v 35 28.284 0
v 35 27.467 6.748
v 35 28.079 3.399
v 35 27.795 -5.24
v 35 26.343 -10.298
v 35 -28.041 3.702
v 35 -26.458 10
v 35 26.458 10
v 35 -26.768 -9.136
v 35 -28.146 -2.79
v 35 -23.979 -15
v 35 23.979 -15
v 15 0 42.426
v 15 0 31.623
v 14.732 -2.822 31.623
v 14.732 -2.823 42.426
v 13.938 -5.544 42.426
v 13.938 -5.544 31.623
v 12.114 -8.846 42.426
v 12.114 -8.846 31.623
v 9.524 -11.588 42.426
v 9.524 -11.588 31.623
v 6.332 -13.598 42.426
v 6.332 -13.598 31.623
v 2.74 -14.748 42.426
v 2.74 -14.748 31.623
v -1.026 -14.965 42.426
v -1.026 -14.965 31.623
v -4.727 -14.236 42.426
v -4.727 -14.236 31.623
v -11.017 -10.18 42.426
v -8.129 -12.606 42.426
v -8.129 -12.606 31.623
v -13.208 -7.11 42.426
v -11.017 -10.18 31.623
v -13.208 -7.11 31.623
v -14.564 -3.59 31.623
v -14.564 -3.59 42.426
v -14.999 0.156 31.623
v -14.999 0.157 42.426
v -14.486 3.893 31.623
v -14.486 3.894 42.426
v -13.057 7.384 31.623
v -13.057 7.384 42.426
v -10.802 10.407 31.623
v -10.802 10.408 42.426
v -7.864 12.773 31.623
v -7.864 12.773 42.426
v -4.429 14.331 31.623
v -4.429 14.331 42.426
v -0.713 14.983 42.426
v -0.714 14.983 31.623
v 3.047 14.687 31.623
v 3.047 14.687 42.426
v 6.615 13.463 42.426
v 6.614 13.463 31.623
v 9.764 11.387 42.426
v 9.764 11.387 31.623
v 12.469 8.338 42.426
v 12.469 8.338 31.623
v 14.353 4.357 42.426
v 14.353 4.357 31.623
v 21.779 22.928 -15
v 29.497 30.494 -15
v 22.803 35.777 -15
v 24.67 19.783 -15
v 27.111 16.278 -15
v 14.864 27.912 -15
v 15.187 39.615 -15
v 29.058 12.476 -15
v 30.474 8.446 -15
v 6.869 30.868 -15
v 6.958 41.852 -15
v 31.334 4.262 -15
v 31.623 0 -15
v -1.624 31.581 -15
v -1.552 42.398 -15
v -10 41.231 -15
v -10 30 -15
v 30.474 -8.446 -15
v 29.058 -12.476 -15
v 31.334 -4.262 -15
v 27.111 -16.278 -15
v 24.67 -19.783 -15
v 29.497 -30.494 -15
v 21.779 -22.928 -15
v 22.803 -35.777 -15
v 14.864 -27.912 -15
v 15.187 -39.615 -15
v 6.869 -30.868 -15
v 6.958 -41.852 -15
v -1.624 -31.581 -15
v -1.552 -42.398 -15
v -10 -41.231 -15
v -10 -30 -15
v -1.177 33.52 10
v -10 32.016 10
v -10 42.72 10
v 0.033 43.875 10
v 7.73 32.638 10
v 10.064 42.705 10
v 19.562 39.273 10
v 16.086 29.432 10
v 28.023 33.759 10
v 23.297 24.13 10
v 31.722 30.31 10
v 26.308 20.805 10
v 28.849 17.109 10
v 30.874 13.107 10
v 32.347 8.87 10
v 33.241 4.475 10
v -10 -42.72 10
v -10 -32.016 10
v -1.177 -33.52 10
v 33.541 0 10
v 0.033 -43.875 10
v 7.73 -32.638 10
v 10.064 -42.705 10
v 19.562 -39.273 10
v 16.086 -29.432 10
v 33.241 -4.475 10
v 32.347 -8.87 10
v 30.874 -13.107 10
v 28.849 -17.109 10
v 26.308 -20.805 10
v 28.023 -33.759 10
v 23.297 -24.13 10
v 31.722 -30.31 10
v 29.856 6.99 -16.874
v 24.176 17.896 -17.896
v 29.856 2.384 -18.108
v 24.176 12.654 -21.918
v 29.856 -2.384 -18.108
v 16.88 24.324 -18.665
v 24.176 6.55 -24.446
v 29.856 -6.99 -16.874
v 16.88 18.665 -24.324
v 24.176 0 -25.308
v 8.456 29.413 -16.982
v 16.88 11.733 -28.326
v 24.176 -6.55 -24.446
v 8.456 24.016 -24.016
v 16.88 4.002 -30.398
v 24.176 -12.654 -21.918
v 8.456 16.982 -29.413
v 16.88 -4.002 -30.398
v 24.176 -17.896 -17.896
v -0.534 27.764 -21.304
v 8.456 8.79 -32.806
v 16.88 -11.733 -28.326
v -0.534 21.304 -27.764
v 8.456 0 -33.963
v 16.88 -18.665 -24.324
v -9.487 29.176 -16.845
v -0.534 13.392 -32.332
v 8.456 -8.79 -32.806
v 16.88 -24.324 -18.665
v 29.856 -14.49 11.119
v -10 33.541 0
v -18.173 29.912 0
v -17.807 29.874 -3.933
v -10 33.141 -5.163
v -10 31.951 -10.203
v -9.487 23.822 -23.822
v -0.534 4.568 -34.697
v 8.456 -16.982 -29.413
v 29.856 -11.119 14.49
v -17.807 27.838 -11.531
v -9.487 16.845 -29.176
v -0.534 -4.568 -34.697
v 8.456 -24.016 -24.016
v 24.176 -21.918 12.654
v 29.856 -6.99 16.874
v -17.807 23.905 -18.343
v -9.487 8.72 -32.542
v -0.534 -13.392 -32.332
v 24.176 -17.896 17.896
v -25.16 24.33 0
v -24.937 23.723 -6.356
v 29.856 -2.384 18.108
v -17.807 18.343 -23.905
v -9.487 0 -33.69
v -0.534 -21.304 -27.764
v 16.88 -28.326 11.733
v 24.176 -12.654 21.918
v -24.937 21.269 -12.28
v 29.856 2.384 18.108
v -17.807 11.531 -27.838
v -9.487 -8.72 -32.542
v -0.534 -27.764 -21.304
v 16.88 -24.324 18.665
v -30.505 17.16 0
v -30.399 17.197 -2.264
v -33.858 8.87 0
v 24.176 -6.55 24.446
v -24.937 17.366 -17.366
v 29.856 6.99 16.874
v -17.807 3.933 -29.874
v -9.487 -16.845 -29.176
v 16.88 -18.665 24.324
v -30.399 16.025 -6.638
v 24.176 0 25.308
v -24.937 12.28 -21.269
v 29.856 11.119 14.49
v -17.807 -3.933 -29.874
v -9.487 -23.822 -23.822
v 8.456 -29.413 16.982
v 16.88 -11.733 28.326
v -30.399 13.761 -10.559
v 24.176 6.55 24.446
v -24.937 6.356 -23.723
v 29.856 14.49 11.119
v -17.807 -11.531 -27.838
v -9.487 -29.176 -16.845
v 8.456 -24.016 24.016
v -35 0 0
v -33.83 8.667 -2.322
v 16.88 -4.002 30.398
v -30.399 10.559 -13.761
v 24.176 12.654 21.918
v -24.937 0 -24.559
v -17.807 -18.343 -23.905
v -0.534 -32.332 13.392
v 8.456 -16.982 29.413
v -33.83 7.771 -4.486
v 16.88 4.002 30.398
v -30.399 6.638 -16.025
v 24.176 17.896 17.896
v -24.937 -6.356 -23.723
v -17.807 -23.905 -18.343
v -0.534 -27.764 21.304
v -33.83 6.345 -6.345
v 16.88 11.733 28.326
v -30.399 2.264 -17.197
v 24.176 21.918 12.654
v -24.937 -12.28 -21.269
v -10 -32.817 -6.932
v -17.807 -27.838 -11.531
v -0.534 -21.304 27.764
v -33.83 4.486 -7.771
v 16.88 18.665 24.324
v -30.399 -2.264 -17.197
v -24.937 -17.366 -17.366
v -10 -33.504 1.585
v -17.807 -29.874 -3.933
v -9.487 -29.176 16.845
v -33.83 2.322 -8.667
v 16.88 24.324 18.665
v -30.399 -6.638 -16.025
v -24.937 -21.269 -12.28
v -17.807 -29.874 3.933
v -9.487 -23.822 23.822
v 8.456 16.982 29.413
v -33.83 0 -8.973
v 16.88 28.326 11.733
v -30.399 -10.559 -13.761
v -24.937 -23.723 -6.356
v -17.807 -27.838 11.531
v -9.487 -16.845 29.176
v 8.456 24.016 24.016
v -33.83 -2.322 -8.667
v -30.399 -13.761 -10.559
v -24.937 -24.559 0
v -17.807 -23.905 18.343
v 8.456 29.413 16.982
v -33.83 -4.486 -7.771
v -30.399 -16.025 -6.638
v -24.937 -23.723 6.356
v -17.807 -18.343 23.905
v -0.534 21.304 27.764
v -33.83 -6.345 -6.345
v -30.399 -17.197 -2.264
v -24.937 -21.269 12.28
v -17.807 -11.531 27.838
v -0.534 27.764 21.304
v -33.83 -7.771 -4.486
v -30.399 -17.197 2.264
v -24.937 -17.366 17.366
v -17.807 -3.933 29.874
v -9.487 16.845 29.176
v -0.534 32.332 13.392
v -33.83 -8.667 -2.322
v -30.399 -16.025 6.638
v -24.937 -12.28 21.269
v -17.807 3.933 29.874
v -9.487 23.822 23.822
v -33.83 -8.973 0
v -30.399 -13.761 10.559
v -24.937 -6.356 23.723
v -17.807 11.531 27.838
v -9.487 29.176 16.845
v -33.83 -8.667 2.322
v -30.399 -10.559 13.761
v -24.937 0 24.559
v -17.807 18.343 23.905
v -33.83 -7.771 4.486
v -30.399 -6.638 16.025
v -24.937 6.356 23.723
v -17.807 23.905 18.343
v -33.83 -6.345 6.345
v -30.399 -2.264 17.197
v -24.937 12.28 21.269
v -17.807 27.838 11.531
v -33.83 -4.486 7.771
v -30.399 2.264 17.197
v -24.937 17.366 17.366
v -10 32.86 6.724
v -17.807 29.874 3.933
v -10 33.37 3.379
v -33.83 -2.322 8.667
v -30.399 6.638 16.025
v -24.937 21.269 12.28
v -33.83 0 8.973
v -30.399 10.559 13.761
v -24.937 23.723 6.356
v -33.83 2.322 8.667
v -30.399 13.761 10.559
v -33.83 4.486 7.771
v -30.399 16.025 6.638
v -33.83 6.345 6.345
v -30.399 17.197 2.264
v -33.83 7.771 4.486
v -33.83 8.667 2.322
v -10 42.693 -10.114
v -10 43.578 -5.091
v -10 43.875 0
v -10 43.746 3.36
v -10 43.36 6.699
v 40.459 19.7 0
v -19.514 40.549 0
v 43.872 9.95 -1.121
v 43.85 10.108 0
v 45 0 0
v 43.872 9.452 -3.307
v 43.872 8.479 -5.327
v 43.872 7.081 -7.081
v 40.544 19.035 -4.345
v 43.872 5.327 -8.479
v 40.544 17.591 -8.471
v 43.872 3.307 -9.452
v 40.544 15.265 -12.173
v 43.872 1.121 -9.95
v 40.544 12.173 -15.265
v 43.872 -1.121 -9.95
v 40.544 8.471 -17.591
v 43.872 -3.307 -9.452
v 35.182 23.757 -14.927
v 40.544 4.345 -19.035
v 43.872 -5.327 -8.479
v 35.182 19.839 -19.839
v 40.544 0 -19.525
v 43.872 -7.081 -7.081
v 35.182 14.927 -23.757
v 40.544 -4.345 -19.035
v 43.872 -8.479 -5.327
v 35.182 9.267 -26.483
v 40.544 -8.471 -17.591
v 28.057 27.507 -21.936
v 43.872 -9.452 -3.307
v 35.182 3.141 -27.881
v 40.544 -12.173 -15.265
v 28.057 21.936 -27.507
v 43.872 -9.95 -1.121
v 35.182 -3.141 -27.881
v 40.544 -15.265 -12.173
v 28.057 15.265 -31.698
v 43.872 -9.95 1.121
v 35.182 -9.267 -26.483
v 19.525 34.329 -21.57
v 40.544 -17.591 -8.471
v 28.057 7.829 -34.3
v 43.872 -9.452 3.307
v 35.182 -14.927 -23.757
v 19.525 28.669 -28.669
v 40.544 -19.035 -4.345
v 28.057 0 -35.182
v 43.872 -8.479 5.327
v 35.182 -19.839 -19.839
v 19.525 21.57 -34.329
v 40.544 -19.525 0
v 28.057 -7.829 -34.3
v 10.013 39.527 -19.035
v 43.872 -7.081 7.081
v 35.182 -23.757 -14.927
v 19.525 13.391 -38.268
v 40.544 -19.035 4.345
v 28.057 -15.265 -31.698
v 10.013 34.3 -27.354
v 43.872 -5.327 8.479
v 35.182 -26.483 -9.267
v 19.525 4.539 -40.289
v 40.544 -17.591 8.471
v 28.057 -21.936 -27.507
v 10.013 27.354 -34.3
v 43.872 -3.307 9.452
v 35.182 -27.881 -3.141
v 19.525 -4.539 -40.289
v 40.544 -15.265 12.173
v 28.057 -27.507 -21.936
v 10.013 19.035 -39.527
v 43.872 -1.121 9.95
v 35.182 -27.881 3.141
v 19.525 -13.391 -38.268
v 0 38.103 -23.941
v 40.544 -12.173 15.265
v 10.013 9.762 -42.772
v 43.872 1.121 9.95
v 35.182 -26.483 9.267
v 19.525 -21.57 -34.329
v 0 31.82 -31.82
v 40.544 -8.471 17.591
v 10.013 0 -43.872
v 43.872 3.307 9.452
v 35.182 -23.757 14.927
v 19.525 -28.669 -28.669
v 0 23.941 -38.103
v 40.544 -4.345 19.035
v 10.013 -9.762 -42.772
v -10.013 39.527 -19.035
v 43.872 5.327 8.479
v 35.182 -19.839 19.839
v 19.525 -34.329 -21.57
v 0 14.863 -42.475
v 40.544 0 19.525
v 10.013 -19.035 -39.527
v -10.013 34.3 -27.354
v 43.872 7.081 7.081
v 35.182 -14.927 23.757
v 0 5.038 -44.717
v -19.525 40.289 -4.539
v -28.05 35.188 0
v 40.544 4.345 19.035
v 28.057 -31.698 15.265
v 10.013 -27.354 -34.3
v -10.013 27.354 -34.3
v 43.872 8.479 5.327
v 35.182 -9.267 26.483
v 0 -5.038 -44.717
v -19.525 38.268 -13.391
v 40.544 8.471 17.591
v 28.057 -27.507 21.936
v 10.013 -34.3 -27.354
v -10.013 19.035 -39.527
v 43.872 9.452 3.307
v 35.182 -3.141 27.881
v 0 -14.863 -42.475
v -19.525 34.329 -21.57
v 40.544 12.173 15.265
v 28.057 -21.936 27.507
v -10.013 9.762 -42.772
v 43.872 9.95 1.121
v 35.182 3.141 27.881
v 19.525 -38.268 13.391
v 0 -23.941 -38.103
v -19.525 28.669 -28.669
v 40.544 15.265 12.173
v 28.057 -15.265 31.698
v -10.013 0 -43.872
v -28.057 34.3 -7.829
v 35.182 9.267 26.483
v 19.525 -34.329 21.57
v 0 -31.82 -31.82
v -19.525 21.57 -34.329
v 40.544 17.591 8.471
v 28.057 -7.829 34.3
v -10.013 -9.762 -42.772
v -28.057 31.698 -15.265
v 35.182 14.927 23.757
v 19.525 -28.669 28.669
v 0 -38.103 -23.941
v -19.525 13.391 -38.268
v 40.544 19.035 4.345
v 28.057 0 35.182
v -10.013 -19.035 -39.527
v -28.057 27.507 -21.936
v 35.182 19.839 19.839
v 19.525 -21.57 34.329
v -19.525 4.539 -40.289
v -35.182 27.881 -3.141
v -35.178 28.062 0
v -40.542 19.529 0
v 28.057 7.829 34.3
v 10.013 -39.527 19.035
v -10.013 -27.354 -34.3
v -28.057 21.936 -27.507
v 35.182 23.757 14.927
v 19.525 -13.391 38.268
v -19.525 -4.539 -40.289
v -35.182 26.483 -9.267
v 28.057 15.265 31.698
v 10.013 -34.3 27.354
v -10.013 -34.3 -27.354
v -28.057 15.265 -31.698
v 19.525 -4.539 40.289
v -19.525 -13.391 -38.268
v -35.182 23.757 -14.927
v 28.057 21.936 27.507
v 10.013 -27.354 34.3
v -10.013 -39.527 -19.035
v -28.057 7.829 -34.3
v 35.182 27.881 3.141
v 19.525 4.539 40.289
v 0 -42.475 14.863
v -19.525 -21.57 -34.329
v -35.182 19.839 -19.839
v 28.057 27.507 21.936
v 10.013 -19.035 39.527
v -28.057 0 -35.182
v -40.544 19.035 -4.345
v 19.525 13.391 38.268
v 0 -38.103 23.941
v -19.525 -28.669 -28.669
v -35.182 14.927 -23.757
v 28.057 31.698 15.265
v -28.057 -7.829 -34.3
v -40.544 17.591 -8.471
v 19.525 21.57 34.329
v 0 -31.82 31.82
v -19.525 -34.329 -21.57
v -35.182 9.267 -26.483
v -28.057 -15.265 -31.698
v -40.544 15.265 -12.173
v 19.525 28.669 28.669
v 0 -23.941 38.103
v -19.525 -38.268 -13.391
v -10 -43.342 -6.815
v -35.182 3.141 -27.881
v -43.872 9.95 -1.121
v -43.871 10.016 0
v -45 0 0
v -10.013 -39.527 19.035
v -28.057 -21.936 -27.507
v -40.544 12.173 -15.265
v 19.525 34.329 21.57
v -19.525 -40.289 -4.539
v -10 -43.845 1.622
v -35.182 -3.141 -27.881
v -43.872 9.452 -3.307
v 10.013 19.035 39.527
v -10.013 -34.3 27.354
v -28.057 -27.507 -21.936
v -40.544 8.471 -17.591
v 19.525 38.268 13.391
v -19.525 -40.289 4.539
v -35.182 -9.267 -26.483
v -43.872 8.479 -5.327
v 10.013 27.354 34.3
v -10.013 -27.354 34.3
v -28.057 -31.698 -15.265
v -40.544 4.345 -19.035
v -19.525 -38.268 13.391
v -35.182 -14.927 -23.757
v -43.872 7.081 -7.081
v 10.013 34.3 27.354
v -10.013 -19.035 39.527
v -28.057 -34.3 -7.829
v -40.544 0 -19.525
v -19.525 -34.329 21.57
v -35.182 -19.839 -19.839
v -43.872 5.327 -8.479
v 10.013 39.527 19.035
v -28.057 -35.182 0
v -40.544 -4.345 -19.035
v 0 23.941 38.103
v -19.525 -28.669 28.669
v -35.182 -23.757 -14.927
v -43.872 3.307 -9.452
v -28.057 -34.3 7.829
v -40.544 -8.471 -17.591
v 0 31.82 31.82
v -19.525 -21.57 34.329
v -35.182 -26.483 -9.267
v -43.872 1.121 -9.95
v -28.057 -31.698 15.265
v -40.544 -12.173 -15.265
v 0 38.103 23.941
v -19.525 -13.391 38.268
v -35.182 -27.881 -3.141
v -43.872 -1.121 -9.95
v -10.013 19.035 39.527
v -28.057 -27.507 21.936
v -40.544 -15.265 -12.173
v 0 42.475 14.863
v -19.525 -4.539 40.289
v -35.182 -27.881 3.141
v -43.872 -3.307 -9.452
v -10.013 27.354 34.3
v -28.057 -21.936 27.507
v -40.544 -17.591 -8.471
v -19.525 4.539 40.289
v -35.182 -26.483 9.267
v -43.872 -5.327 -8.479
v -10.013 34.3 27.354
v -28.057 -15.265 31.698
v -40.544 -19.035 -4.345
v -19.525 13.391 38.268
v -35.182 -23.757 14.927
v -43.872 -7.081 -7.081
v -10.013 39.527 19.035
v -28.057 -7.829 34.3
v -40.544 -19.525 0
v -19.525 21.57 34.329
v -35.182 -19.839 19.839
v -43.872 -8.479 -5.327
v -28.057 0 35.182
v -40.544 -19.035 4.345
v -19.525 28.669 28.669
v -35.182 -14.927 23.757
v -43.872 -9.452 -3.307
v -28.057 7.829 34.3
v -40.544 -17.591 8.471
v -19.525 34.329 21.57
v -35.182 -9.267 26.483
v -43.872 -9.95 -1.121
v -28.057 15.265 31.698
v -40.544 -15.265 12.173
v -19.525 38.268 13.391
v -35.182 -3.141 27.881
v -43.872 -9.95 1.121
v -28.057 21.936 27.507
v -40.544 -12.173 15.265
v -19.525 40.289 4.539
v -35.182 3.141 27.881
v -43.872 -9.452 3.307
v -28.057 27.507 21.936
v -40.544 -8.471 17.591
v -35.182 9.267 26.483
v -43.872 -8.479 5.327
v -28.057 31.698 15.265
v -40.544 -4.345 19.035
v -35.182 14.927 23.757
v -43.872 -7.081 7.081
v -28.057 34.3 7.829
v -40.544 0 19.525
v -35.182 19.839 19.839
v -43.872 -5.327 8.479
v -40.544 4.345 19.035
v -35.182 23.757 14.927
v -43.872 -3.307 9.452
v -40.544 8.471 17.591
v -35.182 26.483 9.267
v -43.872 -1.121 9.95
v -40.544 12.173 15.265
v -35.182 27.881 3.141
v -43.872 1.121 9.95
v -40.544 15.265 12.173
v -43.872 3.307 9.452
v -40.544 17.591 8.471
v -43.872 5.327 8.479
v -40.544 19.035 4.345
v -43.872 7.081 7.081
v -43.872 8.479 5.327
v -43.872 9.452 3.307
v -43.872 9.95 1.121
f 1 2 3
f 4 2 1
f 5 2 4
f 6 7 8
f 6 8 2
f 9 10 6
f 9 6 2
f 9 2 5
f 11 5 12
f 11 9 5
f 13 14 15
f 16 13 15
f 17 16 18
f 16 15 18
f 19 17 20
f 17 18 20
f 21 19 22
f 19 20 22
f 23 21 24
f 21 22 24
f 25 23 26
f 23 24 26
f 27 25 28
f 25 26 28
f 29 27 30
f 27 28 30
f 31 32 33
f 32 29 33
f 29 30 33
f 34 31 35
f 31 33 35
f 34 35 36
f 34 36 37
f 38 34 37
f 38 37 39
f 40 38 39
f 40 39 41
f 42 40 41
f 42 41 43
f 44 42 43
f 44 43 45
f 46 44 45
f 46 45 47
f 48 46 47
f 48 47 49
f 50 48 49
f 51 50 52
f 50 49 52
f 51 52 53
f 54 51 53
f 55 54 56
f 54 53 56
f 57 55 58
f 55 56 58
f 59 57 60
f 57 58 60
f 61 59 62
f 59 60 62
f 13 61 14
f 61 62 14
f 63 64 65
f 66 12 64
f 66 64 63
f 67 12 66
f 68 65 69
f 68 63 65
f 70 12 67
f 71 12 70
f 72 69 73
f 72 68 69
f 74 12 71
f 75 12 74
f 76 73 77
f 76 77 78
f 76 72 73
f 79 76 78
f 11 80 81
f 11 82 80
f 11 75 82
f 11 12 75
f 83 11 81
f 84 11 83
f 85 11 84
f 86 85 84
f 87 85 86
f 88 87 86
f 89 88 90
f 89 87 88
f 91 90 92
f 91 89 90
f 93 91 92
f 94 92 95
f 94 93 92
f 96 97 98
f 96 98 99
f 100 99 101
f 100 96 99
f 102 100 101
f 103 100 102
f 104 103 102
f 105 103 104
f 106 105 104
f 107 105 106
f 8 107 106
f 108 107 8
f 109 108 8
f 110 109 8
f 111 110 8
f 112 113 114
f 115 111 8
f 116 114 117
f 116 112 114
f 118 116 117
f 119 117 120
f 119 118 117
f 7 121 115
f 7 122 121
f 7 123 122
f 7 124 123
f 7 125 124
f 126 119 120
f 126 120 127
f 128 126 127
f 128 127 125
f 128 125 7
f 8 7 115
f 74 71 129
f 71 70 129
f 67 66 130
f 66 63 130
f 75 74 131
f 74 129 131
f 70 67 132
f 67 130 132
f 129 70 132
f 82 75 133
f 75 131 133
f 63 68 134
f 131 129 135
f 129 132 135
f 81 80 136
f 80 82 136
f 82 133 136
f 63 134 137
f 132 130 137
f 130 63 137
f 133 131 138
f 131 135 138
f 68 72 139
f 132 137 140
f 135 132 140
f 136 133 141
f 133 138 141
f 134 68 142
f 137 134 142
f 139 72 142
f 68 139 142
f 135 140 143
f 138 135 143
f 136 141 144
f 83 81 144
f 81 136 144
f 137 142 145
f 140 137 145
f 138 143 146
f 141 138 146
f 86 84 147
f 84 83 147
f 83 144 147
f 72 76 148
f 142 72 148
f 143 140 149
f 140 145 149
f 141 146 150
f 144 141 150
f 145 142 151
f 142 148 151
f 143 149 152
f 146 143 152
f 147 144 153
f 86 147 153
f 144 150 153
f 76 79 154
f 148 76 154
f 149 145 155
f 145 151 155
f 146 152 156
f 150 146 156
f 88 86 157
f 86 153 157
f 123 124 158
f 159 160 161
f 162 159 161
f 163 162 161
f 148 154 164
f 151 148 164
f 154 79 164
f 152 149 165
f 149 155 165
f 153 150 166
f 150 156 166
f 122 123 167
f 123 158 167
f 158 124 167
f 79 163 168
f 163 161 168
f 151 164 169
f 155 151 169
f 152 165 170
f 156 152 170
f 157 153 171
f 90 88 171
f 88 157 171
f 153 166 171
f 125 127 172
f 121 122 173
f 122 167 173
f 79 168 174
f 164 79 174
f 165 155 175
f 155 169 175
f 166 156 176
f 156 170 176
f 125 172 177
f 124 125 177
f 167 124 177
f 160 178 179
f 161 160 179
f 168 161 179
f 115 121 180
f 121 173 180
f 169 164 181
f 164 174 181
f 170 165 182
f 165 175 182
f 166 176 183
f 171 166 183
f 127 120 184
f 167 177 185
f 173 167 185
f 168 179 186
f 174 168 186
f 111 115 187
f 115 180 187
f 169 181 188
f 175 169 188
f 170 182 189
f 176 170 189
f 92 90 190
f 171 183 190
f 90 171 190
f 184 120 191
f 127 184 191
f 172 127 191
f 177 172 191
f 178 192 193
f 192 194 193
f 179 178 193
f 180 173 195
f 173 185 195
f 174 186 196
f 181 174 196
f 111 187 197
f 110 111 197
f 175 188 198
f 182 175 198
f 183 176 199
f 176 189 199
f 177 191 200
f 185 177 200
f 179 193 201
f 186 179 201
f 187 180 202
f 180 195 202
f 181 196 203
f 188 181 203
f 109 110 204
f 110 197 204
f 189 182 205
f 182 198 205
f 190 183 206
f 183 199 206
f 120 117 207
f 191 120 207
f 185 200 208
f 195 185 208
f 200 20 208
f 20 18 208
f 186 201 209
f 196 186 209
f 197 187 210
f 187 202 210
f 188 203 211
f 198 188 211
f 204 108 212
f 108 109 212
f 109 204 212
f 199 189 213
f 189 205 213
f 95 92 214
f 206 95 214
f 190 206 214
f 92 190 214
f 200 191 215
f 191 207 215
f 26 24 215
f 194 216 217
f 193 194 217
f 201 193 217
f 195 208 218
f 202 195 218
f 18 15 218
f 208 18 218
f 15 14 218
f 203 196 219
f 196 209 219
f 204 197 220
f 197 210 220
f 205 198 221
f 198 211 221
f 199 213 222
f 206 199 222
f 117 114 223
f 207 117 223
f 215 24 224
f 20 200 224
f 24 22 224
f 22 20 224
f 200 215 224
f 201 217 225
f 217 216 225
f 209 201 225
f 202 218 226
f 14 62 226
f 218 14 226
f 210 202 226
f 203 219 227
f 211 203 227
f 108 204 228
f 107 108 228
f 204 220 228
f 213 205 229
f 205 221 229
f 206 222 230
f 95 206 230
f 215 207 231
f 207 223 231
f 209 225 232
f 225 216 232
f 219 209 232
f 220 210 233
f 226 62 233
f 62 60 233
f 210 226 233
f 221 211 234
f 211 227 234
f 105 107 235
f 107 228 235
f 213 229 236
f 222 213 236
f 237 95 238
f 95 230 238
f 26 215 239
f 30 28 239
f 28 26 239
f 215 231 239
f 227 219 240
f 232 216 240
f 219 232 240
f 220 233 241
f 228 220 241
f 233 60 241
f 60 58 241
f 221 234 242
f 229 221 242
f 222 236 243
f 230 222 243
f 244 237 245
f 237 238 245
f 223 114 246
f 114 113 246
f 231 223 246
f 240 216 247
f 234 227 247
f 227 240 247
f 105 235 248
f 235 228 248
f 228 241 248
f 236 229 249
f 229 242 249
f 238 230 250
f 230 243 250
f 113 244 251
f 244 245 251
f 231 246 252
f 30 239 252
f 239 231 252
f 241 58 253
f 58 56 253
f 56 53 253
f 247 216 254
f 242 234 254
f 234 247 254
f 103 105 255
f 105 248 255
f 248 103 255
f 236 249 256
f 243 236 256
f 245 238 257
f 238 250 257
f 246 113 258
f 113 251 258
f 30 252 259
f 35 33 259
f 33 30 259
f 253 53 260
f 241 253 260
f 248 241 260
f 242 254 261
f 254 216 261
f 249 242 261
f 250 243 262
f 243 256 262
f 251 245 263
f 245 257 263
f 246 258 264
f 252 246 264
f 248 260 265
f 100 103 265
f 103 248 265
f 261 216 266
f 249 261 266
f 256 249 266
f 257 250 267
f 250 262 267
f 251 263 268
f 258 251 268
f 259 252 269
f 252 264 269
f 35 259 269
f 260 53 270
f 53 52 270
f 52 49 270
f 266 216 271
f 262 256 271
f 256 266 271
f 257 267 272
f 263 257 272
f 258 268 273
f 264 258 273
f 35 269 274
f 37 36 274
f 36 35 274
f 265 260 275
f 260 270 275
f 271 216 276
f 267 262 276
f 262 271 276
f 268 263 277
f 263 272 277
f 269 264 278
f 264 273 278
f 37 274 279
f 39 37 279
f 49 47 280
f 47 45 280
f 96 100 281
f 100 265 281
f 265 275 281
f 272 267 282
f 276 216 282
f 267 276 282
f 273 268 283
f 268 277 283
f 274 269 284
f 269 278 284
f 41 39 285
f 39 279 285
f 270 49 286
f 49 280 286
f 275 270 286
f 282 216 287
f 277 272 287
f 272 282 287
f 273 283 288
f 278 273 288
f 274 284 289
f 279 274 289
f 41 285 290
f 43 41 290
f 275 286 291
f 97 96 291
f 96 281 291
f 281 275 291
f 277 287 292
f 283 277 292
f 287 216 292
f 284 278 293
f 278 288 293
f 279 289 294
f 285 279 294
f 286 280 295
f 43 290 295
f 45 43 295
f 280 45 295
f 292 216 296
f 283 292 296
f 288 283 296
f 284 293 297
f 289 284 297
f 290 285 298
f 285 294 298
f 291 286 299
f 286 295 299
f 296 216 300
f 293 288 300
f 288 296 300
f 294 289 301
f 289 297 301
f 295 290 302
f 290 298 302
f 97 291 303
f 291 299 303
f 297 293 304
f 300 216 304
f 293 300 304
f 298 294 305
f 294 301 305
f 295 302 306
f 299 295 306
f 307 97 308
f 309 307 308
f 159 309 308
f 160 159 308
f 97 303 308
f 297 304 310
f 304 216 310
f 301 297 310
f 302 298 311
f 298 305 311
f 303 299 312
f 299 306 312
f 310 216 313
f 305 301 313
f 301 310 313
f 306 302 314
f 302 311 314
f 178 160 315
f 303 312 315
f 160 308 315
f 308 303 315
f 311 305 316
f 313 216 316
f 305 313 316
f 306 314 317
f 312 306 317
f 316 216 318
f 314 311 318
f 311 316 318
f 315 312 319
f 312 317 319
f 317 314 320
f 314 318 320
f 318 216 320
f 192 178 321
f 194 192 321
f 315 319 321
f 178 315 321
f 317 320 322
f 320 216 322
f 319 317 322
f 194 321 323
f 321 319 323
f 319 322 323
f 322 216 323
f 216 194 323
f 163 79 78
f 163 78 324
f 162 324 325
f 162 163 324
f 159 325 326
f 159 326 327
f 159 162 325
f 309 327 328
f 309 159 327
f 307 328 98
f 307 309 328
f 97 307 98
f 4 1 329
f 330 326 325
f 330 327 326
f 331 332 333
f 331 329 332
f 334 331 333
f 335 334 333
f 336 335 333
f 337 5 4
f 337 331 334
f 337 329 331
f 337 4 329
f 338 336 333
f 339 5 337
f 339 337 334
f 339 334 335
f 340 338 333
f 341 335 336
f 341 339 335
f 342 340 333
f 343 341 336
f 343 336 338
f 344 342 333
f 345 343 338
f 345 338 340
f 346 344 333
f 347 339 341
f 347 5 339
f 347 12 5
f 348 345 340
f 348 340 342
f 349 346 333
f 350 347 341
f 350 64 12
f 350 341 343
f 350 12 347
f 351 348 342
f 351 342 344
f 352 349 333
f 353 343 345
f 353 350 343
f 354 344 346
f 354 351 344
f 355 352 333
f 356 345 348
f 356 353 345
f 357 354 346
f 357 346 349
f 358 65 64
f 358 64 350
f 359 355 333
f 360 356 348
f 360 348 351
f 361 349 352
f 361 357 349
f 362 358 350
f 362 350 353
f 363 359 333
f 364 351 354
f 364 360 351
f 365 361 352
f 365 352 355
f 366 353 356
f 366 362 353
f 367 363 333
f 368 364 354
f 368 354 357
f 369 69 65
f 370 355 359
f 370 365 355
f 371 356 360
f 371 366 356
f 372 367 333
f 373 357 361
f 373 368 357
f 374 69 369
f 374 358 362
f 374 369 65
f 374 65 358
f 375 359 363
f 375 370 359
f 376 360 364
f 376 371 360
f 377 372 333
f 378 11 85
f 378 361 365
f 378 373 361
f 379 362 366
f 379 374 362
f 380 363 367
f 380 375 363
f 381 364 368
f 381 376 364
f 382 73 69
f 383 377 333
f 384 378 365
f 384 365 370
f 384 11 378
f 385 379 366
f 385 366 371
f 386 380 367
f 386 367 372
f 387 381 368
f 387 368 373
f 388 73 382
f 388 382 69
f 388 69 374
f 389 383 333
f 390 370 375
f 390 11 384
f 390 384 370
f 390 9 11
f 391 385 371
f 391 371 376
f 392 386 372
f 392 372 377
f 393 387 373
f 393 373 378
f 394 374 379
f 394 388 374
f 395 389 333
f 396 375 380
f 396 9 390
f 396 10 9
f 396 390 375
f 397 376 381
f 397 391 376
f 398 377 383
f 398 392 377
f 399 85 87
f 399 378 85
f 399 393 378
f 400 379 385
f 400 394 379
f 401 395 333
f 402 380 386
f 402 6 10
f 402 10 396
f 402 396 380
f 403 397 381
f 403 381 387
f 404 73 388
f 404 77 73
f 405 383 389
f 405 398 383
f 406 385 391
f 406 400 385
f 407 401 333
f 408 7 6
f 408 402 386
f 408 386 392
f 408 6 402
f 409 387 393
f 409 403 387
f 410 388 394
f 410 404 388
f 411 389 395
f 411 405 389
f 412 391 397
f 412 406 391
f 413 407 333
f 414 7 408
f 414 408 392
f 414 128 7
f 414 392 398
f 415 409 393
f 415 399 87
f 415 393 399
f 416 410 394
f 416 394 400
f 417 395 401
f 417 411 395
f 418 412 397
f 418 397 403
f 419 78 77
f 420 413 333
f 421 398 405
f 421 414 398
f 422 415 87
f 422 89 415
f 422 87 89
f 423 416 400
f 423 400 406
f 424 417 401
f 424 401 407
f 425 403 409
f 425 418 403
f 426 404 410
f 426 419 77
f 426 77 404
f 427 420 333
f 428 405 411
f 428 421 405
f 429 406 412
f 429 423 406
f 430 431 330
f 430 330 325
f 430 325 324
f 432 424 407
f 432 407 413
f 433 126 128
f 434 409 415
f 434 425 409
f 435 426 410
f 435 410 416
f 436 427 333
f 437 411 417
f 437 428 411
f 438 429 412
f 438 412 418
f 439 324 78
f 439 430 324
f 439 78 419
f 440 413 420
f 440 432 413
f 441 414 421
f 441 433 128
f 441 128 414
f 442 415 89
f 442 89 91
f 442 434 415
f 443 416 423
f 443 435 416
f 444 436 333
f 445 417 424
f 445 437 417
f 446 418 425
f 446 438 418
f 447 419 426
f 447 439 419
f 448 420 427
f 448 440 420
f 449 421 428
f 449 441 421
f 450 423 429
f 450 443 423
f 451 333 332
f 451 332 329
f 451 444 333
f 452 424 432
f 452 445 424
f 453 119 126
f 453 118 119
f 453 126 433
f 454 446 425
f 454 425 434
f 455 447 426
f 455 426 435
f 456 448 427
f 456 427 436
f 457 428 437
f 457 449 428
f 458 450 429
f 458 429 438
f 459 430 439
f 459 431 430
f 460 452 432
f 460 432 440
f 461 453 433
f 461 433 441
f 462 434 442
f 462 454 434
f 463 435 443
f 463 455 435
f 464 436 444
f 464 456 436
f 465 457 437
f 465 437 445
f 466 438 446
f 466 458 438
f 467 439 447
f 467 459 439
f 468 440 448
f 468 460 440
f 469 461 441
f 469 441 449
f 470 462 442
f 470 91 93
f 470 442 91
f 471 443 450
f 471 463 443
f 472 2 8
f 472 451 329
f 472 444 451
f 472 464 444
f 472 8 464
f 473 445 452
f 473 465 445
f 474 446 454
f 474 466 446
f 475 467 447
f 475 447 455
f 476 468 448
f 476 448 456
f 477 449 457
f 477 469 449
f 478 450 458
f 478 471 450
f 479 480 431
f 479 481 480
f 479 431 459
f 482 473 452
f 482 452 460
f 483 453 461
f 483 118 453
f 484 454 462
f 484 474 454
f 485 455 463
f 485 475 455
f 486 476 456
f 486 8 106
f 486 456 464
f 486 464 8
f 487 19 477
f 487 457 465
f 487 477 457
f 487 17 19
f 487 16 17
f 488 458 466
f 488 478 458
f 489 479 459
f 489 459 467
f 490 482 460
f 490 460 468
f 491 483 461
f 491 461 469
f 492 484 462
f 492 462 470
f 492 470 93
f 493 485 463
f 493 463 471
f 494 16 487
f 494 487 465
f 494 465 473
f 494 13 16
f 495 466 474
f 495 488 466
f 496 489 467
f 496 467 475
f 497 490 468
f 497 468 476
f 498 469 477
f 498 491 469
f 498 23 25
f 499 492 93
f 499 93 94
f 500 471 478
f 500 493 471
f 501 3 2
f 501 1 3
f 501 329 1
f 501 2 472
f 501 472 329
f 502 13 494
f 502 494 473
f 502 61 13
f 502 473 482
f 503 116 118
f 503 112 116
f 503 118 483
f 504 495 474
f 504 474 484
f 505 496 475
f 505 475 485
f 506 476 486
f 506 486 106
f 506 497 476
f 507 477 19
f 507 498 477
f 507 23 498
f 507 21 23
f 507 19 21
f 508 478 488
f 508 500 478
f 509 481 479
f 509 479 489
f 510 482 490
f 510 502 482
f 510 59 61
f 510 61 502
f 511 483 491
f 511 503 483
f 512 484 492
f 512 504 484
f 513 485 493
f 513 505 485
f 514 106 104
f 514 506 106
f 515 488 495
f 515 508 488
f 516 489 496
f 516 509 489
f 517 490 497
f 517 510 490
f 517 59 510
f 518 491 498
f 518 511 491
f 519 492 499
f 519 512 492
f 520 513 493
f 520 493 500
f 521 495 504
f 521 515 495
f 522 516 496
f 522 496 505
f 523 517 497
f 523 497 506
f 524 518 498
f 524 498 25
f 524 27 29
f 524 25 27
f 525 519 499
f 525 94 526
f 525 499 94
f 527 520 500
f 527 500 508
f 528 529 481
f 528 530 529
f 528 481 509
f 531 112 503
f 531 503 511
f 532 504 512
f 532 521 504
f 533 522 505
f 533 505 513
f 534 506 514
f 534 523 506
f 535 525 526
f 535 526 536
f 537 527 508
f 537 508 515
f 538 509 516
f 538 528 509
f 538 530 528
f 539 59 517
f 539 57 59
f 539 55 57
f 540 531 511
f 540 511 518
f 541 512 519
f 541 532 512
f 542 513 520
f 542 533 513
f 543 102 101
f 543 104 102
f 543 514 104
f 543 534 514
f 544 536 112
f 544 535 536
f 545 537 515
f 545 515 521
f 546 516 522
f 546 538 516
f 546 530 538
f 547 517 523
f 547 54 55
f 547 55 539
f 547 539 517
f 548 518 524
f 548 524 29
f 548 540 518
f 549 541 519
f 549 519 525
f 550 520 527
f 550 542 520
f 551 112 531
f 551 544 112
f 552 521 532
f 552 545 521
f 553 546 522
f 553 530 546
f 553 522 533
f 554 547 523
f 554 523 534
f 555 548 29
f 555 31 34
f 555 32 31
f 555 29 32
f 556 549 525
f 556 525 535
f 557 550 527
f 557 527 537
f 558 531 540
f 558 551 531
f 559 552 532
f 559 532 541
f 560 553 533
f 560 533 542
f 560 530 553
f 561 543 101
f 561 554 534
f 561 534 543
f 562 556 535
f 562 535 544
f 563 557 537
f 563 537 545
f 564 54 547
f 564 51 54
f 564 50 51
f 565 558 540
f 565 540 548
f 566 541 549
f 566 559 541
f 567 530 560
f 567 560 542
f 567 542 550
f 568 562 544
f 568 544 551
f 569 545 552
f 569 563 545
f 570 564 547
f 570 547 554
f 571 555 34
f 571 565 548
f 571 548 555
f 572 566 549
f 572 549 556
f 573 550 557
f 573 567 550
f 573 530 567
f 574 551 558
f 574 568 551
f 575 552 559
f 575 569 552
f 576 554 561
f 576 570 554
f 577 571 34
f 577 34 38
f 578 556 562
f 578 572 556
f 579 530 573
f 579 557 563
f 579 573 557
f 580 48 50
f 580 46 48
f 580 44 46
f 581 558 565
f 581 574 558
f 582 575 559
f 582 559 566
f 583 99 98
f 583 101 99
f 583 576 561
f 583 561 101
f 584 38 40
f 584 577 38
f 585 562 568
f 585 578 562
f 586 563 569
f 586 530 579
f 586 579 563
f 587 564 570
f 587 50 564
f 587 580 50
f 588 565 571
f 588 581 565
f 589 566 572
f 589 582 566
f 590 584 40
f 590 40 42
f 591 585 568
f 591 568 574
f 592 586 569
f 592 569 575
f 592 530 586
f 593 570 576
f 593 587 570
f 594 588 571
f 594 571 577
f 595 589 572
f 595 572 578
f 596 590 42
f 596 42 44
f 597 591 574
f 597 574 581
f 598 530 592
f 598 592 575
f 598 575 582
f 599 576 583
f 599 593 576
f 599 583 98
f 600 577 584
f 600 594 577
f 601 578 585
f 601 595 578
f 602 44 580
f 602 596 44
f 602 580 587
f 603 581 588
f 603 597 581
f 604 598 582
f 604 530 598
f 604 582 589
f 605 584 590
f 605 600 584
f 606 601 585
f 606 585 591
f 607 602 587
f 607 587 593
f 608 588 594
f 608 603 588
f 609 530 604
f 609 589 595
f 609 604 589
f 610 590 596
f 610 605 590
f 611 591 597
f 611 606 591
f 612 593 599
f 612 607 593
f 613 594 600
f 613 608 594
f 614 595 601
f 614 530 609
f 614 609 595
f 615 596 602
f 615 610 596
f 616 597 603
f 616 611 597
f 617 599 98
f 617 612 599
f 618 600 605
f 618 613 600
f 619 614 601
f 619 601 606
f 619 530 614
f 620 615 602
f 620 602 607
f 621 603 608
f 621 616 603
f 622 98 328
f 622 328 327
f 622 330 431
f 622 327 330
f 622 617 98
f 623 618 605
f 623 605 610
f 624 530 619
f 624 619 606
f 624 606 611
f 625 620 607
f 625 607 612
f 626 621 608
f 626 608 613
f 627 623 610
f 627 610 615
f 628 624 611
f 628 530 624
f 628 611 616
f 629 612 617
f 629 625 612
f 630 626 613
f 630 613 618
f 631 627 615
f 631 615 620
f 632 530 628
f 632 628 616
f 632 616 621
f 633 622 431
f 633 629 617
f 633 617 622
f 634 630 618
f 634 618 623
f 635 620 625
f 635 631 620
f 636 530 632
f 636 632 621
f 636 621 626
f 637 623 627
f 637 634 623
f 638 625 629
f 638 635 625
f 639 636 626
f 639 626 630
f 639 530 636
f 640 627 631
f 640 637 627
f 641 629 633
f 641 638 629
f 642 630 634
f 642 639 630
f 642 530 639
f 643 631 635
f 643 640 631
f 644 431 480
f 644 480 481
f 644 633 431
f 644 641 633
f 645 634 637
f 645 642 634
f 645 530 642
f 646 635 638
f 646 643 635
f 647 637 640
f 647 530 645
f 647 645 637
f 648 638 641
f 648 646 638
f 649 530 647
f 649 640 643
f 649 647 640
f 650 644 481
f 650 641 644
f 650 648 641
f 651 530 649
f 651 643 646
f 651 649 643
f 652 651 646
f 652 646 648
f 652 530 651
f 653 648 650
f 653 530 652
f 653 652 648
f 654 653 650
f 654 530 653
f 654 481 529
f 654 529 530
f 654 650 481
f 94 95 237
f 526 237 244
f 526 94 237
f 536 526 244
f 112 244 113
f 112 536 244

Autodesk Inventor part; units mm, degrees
ref_plane "YZ Plane" through (0, 0, 0) normal (1, 0, 0) x (0, 1, 0)
ref_plane "XZ Plane" through (0, 0, 0) normal (0, 1, 0) x (-1, 0, 0)
ref_plane "XY Plane" through (0, 0, 0) normal (0, 0, 1) x (1, 0, 0)
sketch "Эскиз1" plane through (0, 0, 0) normal (0, 0, 1) x (1, 0, 0)
  arc A0 (45, 0) -> (-45, 0) centre (0, 0) ccw
  arc A1 (35, 0) -> (-35, 0) centre (0, 0) ccw
  line L0 (-45, 0) -> (-35, 0)
  line L1 (35, 0) -> (45, 0)
  line L2 (-63, 0) -> (63, 0) projected
  dimension "d0" = 45
  dimension "d1" = 35
revolve "Вращение1" add sketch "Эскиз1" angle 360 about axis through (-10, 0, 0) along (1, 0, 0) contours L1 A1 L0 A0
sketch "Эскиз2" plane through (0, 0, 0) normal (0, 0, 1) x (1, 0, 0)
  circle A0 centre (0, 0) radius 15
  dimension "d3" = 30
extrude "Выдавливание1" cut sketch "Эскиз2" along normal through all
sketch "Эскиз3" plane through (0, 0, 0) normal (0, 1, 0) x (-1, 0, 0)
  line L0 (-35, -15) -> (10, -15)
  line L1 (10, -15) -> (10, 10)
  line L2 (10, 10) -> (-35, 10)
  line L3 (-35, 10) -> (-35, -15)
  point P0 (0, 0)
  dimension "d6" = 10
  dimension "d7" = 45
  dimension "d8" = 10
  dimension "d9" = 25
extrude "Выдавливание2" cut sketch "Эскиз3" along normal through all both and the other way through all
